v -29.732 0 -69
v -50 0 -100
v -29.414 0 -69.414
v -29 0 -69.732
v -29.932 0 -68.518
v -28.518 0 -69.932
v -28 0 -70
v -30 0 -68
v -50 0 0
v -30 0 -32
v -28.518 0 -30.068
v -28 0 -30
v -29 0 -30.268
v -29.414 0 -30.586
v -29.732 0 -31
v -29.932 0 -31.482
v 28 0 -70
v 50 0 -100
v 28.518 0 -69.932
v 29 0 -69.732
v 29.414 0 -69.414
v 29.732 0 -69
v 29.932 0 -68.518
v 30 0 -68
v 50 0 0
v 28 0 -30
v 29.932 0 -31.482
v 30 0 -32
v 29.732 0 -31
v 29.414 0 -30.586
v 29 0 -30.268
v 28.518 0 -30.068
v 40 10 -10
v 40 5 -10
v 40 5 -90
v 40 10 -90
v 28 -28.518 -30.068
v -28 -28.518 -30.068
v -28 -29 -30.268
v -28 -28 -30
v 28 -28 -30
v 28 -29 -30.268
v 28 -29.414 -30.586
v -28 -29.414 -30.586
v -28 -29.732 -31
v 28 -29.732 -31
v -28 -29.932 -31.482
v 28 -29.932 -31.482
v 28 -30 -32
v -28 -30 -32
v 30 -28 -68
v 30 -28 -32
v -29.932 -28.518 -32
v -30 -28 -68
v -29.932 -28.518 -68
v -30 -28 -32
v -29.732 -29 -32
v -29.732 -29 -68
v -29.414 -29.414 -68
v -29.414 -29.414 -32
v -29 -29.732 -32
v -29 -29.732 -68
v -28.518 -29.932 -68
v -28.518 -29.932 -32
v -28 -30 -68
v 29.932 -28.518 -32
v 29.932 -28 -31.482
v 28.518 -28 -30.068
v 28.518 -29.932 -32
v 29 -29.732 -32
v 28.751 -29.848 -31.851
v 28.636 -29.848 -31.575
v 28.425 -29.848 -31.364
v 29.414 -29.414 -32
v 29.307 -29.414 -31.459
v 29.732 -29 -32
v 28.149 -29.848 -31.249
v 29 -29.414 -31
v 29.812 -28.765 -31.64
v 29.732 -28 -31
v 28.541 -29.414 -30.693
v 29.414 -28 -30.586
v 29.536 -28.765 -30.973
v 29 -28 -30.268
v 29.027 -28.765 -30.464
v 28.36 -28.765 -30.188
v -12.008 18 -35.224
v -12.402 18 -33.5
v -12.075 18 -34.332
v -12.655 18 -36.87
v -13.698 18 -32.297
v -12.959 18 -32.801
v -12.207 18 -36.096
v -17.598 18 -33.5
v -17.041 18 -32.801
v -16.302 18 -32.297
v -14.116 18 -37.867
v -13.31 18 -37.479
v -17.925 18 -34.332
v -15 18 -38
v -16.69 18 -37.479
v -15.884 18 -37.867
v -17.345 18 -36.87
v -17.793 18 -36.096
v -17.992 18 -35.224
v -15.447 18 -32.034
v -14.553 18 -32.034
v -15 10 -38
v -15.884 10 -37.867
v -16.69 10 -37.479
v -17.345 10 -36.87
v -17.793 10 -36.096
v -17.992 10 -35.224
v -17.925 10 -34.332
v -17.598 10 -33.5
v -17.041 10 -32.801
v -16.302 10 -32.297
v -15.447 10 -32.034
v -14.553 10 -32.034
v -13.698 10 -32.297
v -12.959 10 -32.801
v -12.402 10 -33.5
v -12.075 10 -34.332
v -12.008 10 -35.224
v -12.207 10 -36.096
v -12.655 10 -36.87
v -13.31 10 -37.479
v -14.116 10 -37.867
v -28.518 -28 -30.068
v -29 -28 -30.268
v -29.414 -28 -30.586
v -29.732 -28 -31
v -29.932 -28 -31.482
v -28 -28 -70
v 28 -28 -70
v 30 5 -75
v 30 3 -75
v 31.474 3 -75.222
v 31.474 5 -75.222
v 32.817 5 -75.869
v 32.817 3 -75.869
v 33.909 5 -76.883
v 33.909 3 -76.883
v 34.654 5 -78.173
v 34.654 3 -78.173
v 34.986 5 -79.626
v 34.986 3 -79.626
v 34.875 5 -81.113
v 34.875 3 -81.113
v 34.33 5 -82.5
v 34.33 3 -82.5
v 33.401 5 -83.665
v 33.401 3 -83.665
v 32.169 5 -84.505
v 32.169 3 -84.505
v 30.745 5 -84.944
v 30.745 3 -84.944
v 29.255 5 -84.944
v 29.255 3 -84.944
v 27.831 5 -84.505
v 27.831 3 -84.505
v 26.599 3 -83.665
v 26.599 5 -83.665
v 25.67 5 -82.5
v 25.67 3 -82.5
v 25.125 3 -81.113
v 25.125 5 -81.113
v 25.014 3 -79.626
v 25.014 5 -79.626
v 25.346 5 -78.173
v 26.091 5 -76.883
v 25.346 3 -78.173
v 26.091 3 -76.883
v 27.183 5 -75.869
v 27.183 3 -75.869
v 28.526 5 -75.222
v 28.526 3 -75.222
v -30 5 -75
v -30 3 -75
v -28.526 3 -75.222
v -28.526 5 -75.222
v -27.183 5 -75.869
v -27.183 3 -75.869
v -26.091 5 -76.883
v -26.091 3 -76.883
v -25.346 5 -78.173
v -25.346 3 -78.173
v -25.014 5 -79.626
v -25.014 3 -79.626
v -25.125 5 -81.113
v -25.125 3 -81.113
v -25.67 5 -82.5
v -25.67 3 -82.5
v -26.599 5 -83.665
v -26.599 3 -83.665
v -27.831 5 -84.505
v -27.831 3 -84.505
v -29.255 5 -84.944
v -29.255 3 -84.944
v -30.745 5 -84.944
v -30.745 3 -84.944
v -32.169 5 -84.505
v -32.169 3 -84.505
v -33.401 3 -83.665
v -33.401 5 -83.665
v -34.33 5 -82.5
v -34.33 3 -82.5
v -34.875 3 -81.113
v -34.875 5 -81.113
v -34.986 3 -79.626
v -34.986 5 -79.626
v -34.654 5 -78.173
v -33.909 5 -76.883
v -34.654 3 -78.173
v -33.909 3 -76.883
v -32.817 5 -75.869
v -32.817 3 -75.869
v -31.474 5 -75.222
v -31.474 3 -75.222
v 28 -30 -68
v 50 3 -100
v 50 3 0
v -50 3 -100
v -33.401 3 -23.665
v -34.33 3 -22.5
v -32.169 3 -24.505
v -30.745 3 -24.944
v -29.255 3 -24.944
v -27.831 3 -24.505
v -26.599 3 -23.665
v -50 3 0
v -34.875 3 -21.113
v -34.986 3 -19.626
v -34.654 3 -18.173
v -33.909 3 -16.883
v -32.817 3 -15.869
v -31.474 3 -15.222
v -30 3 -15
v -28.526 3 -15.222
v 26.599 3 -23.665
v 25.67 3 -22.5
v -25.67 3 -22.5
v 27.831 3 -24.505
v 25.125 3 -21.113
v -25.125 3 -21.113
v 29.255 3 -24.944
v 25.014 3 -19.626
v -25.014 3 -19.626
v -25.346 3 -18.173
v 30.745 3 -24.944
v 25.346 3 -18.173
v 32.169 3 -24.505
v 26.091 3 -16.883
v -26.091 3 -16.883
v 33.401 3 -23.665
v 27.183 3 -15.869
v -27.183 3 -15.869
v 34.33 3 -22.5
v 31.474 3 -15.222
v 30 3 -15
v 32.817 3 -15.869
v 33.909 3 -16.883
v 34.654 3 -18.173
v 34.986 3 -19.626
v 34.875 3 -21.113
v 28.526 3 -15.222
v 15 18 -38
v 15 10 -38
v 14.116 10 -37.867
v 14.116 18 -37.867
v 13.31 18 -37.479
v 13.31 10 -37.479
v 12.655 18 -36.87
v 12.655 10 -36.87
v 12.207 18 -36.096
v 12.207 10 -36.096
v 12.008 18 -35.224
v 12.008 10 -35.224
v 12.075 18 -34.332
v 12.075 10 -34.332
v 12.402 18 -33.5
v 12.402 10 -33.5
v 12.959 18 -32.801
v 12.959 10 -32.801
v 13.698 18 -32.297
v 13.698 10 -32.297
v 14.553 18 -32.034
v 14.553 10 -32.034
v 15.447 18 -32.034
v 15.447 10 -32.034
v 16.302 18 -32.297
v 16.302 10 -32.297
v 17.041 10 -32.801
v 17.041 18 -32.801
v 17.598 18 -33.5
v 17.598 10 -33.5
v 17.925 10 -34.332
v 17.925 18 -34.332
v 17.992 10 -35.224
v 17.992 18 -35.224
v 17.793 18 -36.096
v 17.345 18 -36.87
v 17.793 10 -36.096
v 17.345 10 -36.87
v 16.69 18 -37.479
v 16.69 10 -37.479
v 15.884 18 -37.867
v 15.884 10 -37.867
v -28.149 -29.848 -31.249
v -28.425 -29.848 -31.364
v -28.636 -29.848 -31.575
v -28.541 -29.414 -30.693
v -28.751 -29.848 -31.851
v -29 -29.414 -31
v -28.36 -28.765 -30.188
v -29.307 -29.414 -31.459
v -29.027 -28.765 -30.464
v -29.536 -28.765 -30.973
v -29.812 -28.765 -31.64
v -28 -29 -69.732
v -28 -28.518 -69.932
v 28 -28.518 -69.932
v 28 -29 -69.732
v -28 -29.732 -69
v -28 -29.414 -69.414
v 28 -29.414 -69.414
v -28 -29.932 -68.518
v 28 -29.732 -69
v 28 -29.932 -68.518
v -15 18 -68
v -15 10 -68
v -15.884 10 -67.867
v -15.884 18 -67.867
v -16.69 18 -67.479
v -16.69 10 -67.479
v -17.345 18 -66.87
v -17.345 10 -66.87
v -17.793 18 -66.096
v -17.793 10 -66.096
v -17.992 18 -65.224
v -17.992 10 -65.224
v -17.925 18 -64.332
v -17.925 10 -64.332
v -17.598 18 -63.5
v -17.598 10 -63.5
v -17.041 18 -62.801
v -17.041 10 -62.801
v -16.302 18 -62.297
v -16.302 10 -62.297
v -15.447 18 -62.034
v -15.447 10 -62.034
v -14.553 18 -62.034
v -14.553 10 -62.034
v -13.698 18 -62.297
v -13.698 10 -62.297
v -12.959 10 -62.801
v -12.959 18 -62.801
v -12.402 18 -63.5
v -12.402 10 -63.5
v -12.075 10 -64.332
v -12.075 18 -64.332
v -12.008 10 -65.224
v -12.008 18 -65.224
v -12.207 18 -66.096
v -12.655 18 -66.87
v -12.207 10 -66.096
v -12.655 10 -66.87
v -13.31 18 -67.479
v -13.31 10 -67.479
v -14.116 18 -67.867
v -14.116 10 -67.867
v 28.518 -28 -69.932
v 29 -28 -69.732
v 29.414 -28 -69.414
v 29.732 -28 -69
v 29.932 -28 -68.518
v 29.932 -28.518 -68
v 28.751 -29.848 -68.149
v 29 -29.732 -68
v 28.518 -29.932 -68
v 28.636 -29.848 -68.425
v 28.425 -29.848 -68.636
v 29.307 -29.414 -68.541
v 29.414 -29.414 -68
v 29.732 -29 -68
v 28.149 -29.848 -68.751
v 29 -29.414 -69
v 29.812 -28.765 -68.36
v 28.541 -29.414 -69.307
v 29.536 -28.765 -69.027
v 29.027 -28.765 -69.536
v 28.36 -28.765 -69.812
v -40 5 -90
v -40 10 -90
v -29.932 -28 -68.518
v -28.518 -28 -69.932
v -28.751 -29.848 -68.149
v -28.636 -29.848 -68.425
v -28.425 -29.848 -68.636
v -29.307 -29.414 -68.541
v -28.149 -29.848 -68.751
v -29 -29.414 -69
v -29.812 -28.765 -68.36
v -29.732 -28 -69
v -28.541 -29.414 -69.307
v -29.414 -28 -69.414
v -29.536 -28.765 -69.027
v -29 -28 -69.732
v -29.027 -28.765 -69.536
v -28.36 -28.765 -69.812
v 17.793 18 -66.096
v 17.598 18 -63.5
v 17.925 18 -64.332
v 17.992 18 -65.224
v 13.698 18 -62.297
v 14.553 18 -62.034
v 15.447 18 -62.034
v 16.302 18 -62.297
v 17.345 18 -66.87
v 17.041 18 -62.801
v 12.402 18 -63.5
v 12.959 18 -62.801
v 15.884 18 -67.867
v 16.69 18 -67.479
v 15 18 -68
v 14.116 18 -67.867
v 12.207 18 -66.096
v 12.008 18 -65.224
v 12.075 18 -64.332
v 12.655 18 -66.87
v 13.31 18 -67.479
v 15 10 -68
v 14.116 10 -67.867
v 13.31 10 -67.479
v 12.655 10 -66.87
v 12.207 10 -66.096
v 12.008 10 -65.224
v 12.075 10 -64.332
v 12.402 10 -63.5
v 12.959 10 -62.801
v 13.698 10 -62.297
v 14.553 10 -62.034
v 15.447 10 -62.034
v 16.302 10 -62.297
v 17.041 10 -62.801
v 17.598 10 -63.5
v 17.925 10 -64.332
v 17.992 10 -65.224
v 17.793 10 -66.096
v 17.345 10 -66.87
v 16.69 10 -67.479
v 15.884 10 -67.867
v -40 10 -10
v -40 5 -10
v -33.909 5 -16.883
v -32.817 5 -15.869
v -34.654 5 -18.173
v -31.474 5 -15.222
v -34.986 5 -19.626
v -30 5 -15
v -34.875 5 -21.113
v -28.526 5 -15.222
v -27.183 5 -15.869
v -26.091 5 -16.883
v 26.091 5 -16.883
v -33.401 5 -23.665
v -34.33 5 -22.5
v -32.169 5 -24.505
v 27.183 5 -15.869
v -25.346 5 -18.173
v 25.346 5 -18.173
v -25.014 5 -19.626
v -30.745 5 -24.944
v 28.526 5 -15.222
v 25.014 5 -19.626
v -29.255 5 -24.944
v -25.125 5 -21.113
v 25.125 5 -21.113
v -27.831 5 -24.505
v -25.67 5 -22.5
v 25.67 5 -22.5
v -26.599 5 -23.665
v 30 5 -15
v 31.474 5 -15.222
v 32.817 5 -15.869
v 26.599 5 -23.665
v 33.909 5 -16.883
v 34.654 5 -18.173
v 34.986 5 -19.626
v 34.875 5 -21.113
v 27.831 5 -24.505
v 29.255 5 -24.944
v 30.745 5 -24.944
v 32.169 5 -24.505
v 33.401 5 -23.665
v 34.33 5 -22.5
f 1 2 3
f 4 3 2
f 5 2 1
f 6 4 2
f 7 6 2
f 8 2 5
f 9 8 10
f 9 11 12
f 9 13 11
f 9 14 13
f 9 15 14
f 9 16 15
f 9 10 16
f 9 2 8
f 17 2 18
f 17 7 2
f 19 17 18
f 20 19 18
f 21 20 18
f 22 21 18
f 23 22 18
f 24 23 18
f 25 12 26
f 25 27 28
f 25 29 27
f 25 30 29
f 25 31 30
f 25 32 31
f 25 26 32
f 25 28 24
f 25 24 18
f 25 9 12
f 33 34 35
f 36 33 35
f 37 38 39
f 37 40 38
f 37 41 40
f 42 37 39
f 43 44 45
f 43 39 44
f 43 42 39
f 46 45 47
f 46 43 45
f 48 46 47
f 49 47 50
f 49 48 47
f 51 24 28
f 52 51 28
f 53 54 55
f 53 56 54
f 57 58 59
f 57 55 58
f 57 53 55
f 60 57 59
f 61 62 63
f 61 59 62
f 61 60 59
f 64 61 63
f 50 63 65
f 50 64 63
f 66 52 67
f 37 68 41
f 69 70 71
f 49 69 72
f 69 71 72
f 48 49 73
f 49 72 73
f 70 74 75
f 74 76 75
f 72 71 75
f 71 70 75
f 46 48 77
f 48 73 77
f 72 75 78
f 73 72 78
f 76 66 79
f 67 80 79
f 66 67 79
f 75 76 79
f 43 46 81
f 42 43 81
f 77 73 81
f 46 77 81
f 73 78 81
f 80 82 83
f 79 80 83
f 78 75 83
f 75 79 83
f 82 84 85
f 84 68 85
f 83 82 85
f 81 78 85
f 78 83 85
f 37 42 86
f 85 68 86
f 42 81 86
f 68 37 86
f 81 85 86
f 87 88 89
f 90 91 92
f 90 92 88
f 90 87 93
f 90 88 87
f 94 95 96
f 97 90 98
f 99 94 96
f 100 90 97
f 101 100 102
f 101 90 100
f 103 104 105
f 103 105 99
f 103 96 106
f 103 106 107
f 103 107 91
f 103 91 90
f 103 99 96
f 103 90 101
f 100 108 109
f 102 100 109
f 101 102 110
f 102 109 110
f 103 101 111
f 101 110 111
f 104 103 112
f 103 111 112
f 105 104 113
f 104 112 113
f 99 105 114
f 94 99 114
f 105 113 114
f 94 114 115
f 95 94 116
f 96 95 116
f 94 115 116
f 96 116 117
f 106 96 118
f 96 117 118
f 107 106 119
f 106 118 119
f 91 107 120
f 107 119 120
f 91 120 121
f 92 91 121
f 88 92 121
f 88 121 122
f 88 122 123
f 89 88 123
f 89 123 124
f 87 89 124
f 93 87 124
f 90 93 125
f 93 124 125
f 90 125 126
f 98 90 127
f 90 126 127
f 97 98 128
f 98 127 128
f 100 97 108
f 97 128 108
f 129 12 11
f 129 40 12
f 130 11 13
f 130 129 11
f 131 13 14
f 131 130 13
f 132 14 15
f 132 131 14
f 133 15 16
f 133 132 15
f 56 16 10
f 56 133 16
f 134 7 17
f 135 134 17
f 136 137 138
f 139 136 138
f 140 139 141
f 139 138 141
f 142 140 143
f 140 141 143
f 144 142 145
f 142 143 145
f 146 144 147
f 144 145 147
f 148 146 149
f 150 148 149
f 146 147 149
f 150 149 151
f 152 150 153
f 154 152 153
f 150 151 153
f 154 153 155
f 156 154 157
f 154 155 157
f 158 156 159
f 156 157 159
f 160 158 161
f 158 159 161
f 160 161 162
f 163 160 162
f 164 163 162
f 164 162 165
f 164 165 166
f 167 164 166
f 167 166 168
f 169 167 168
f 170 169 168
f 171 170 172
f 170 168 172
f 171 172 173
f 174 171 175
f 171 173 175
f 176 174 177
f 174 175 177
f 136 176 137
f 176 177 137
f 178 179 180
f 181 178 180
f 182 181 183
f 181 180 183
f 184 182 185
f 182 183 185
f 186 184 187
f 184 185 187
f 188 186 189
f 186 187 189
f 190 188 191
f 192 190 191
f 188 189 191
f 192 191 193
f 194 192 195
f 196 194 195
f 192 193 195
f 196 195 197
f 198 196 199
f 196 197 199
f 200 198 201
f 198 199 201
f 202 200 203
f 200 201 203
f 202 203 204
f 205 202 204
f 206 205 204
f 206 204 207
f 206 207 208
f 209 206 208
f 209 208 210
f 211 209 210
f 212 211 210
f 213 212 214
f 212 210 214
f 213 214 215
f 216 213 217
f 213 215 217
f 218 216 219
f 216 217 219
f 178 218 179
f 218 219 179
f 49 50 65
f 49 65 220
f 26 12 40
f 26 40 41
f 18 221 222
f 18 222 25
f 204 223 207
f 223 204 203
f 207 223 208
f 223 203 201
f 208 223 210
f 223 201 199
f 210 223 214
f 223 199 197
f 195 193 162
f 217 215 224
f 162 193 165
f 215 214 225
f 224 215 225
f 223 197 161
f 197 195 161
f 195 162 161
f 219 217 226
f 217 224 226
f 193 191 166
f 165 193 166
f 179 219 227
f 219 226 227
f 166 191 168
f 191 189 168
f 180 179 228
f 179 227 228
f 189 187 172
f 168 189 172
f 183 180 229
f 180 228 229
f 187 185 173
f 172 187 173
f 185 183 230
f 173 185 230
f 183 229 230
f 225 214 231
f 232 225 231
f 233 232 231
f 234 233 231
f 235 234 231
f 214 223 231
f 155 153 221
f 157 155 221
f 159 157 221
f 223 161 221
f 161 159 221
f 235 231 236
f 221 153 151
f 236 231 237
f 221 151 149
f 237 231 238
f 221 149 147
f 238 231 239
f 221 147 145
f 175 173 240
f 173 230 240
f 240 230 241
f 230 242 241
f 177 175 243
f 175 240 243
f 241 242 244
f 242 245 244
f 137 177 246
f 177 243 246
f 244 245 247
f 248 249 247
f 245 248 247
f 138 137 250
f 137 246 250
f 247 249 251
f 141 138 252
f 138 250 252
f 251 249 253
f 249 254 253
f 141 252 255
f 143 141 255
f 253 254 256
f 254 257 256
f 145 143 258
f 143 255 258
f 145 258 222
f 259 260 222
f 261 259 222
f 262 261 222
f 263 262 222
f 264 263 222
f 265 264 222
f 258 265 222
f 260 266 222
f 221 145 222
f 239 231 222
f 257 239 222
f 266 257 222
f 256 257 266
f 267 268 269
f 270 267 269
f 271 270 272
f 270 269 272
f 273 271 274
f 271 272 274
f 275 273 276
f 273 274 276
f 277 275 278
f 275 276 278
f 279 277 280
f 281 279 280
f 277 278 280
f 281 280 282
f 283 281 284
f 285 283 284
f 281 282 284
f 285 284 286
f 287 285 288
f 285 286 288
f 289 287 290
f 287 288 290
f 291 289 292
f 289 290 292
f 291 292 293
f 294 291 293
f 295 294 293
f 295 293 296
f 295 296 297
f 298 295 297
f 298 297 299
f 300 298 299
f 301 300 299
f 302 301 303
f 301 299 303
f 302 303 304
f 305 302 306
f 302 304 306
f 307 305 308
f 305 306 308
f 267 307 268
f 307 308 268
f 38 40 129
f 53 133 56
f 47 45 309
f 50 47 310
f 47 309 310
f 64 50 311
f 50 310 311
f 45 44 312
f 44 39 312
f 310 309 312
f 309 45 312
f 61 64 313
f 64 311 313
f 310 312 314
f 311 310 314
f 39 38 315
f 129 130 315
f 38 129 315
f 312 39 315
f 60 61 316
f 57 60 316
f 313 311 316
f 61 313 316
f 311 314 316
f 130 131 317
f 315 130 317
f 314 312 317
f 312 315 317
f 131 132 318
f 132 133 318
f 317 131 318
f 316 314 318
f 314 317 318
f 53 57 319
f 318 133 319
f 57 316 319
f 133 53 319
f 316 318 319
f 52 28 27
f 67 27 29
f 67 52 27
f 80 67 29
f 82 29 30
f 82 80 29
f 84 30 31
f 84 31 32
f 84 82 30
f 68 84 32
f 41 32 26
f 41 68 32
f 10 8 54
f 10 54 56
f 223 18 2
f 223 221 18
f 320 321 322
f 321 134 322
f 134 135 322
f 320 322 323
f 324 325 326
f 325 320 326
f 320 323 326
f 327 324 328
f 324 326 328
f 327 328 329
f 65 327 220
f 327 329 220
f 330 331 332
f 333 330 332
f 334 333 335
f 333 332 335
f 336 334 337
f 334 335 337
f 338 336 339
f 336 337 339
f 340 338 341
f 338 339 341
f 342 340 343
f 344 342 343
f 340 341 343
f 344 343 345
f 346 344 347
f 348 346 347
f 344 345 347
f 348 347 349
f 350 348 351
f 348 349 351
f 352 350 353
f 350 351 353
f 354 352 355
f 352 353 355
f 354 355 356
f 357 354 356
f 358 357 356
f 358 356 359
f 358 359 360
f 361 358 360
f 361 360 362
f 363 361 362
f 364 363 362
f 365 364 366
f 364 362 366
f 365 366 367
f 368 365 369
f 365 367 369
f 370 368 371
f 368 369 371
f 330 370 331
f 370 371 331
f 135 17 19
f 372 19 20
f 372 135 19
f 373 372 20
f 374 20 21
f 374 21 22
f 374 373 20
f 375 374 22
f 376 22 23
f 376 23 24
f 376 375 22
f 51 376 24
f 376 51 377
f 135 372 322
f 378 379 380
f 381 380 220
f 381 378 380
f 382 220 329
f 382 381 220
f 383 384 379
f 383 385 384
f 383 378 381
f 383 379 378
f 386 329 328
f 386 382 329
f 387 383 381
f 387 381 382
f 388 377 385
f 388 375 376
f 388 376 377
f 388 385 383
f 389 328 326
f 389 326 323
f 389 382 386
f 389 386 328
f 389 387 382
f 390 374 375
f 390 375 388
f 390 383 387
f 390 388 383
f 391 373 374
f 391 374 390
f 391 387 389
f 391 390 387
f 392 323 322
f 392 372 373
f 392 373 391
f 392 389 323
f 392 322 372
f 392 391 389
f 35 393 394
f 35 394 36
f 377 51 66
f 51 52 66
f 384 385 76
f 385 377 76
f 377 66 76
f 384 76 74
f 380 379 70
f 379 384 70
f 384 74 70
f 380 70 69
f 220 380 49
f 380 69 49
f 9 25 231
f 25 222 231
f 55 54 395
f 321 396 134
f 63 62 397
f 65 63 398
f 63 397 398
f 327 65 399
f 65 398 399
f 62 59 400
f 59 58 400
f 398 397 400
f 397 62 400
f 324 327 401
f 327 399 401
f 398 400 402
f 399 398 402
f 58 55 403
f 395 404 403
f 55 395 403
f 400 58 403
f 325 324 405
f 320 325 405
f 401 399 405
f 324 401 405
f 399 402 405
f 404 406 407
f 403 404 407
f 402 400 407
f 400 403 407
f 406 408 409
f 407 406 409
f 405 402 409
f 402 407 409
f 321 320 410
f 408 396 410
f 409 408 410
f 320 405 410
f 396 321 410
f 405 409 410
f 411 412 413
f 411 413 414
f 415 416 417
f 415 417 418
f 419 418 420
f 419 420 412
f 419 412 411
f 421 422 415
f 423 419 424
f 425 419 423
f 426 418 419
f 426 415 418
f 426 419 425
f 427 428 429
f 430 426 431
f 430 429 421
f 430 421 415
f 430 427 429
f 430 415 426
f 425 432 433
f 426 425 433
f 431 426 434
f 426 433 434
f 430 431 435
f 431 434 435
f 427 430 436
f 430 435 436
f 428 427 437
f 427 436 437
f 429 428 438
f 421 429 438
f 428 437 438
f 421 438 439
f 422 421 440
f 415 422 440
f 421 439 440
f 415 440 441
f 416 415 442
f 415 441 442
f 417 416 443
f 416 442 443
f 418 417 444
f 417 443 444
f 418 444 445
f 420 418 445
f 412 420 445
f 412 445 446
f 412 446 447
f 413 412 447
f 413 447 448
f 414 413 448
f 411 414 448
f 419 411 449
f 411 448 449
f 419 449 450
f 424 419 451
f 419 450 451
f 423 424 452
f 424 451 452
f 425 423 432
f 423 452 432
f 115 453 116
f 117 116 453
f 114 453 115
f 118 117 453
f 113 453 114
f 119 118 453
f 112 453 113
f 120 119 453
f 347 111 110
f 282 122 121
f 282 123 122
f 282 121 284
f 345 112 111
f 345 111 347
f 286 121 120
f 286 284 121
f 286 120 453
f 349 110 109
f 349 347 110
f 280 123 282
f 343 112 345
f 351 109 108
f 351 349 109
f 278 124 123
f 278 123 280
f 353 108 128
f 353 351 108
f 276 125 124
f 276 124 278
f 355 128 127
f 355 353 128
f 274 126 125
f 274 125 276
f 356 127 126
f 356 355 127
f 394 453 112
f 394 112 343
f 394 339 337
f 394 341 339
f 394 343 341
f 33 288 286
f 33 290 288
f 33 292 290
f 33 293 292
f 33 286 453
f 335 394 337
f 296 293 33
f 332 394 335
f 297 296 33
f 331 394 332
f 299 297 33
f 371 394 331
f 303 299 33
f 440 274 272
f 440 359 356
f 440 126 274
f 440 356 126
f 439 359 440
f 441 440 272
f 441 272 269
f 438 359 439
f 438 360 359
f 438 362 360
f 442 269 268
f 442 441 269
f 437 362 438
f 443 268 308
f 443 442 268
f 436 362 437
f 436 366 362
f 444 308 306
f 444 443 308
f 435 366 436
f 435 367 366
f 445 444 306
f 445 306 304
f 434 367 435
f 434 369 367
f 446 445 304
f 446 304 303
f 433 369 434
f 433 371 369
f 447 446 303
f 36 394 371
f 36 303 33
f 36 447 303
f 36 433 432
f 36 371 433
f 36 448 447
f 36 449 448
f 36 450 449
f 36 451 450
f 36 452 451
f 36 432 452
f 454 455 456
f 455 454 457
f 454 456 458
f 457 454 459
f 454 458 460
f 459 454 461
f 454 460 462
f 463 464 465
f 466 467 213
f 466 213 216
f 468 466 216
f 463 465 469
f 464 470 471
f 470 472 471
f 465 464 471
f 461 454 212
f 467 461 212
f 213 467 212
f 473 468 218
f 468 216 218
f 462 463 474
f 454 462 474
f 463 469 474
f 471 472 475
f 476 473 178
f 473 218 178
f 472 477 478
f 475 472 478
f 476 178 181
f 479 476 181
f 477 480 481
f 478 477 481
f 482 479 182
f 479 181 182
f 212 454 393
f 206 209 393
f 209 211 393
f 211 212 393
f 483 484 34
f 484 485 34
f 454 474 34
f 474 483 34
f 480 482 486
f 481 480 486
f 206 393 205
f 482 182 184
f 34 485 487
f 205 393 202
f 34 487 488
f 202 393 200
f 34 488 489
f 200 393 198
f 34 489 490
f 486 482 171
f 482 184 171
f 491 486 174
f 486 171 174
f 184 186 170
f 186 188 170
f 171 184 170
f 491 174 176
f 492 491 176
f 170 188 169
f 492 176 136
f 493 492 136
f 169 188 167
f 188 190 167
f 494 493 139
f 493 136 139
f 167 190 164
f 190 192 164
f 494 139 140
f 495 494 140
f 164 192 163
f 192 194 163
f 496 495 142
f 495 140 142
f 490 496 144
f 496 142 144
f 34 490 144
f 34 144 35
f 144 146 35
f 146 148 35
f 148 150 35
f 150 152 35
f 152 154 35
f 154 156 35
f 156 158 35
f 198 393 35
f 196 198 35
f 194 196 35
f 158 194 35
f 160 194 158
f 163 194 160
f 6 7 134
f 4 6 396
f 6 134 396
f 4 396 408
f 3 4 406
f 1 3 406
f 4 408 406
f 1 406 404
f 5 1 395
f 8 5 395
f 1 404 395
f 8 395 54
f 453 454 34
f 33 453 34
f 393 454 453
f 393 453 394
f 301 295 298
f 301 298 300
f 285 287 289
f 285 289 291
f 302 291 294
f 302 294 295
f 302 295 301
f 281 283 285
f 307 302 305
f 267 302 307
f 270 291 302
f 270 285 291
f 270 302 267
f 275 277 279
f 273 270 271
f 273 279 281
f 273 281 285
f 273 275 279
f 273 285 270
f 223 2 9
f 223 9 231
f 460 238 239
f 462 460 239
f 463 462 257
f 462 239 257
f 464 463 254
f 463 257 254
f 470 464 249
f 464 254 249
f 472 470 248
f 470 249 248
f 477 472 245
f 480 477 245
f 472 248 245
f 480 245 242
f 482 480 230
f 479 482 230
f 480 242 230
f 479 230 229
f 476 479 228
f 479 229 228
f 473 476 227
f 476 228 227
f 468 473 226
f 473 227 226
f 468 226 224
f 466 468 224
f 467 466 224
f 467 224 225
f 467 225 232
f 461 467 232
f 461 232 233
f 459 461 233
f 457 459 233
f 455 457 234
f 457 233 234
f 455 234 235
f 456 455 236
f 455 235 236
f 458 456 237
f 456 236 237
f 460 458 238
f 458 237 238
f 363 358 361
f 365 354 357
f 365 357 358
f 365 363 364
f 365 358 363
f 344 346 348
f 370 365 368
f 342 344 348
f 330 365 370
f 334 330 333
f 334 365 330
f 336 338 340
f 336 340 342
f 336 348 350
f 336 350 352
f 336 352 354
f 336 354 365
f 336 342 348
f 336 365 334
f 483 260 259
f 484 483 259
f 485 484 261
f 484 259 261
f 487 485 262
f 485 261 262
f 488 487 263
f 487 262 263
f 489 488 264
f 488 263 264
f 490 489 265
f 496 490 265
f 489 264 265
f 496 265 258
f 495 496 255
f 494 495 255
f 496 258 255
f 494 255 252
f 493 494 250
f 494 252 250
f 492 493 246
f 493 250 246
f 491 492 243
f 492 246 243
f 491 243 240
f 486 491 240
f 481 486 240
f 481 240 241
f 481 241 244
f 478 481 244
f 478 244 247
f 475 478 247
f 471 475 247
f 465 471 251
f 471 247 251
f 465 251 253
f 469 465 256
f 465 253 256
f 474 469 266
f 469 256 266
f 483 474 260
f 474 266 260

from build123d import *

# Parameters (mm, degrees)
EXTRUDE_1_DEPTH = 100
SKETCH_2_R      = 5
EXTRUDE_2_DEPTH = 2
SKETCH_3_W      = 80
SKETCH_3_H      = 80
EXTRUDE_3_DEPTH = 5
SKETCH_4_R      = 3
EXTRUDE_4_DEPTH = 8
SKETCH_5_W      = 60
SKETCH_5_H      = 40
EXTRUDE_5_DEPTH = 30
FILLET_1_R      = 2


with BuildPart() as part:
    # 草图1 → 凸台-拉伸1 (new body)
    with BuildSketch(Plane.XY):
        Polygon((0, 0), (-50, 0), (-50, 3), (50, 3), (50, 0), align=None)
    extrude(amount=-EXTRUDE_1_DEPTH)

    # 草图2 → 凸台-拉伸2 (add)
    with BuildSketch(Plane(origin=(0, 3, 0), x_dir=(1, 0, 0), z_dir=(0, 1, 0))):
        with Locations(Location((-30, 80, 0), (0, 0, 270))):
            Circle(SKETCH_2_R)
        with Locations(Location((30, 80, 0), (0, 0, 270))):
            Circle(SKETCH_2_R)
        with Locations(Location((-30, 20, 0), (0, 0, 270))):
            Circle(SKETCH_2_R)
        with Locations(Location((30, 20, 0), (0, 0, 270))):
            Circle(SKETCH_2_R)
    extrude(amount=EXTRUDE_2_DEPTH)

    # 草图3 → 凸台-拉伸3 (add)
    with BuildSketch(Plane(origin=(0, 5, 0), x_dir=(1, 0, 0), z_dir=(0, 1, 0))):
        with Locations((0, 50)):
            Rectangle(SKETCH_3_W, SKETCH_3_H)
    extrude(amount=EXTRUDE_3_DEPTH)

    # 草图4 → 凸台-拉伸4 (add)
    with BuildSketch(Plane(origin=(0, 10, 0), x_dir=(1, 0, 0), z_dir=(0, 1, 0))):
        with Locations(Location((-15, 65, 0), (0, 0, 90))):
            Circle(SKETCH_4_R)
        with Locations(Location((15, 65, 0), (0, 0, 90))):
            Circle(SKETCH_4_R)
        with Locations(Location((-15, 35, 0), (0, 0, 90))):
            Circle(SKETCH_4_R)
        with Locations(Location((15, 35, 0), (0, 0, 90))):
            Circle(SKETCH_4_R)
    extrude(amount=EXTRUDE_4_DEPTH)

    # 草图5 → 凸台-拉伸5 (add)
    with BuildSketch(Plane.XZ):
        with Locations((0, -50)):
            Rectangle(SKETCH_5_W, SKETCH_5_H)
    extrude(amount=EXTRUDE_5_DEPTH)

    # 圆角1
    fillet_1_edges = [part.edges().sort_by_distance(p)[0] for p in [
        (30, -15, -70),
        (30, -15, -30),
        (-30, -15, -30),
        (-30, -15, -70),
        (30, -30, -50),
        (0, -30, -30),
        (-30, -30, -50),
        (0, -30, -70),
    ]]
    fillet(fillet_1_edges, radius=FILLET_1_R)


solid = part.part
